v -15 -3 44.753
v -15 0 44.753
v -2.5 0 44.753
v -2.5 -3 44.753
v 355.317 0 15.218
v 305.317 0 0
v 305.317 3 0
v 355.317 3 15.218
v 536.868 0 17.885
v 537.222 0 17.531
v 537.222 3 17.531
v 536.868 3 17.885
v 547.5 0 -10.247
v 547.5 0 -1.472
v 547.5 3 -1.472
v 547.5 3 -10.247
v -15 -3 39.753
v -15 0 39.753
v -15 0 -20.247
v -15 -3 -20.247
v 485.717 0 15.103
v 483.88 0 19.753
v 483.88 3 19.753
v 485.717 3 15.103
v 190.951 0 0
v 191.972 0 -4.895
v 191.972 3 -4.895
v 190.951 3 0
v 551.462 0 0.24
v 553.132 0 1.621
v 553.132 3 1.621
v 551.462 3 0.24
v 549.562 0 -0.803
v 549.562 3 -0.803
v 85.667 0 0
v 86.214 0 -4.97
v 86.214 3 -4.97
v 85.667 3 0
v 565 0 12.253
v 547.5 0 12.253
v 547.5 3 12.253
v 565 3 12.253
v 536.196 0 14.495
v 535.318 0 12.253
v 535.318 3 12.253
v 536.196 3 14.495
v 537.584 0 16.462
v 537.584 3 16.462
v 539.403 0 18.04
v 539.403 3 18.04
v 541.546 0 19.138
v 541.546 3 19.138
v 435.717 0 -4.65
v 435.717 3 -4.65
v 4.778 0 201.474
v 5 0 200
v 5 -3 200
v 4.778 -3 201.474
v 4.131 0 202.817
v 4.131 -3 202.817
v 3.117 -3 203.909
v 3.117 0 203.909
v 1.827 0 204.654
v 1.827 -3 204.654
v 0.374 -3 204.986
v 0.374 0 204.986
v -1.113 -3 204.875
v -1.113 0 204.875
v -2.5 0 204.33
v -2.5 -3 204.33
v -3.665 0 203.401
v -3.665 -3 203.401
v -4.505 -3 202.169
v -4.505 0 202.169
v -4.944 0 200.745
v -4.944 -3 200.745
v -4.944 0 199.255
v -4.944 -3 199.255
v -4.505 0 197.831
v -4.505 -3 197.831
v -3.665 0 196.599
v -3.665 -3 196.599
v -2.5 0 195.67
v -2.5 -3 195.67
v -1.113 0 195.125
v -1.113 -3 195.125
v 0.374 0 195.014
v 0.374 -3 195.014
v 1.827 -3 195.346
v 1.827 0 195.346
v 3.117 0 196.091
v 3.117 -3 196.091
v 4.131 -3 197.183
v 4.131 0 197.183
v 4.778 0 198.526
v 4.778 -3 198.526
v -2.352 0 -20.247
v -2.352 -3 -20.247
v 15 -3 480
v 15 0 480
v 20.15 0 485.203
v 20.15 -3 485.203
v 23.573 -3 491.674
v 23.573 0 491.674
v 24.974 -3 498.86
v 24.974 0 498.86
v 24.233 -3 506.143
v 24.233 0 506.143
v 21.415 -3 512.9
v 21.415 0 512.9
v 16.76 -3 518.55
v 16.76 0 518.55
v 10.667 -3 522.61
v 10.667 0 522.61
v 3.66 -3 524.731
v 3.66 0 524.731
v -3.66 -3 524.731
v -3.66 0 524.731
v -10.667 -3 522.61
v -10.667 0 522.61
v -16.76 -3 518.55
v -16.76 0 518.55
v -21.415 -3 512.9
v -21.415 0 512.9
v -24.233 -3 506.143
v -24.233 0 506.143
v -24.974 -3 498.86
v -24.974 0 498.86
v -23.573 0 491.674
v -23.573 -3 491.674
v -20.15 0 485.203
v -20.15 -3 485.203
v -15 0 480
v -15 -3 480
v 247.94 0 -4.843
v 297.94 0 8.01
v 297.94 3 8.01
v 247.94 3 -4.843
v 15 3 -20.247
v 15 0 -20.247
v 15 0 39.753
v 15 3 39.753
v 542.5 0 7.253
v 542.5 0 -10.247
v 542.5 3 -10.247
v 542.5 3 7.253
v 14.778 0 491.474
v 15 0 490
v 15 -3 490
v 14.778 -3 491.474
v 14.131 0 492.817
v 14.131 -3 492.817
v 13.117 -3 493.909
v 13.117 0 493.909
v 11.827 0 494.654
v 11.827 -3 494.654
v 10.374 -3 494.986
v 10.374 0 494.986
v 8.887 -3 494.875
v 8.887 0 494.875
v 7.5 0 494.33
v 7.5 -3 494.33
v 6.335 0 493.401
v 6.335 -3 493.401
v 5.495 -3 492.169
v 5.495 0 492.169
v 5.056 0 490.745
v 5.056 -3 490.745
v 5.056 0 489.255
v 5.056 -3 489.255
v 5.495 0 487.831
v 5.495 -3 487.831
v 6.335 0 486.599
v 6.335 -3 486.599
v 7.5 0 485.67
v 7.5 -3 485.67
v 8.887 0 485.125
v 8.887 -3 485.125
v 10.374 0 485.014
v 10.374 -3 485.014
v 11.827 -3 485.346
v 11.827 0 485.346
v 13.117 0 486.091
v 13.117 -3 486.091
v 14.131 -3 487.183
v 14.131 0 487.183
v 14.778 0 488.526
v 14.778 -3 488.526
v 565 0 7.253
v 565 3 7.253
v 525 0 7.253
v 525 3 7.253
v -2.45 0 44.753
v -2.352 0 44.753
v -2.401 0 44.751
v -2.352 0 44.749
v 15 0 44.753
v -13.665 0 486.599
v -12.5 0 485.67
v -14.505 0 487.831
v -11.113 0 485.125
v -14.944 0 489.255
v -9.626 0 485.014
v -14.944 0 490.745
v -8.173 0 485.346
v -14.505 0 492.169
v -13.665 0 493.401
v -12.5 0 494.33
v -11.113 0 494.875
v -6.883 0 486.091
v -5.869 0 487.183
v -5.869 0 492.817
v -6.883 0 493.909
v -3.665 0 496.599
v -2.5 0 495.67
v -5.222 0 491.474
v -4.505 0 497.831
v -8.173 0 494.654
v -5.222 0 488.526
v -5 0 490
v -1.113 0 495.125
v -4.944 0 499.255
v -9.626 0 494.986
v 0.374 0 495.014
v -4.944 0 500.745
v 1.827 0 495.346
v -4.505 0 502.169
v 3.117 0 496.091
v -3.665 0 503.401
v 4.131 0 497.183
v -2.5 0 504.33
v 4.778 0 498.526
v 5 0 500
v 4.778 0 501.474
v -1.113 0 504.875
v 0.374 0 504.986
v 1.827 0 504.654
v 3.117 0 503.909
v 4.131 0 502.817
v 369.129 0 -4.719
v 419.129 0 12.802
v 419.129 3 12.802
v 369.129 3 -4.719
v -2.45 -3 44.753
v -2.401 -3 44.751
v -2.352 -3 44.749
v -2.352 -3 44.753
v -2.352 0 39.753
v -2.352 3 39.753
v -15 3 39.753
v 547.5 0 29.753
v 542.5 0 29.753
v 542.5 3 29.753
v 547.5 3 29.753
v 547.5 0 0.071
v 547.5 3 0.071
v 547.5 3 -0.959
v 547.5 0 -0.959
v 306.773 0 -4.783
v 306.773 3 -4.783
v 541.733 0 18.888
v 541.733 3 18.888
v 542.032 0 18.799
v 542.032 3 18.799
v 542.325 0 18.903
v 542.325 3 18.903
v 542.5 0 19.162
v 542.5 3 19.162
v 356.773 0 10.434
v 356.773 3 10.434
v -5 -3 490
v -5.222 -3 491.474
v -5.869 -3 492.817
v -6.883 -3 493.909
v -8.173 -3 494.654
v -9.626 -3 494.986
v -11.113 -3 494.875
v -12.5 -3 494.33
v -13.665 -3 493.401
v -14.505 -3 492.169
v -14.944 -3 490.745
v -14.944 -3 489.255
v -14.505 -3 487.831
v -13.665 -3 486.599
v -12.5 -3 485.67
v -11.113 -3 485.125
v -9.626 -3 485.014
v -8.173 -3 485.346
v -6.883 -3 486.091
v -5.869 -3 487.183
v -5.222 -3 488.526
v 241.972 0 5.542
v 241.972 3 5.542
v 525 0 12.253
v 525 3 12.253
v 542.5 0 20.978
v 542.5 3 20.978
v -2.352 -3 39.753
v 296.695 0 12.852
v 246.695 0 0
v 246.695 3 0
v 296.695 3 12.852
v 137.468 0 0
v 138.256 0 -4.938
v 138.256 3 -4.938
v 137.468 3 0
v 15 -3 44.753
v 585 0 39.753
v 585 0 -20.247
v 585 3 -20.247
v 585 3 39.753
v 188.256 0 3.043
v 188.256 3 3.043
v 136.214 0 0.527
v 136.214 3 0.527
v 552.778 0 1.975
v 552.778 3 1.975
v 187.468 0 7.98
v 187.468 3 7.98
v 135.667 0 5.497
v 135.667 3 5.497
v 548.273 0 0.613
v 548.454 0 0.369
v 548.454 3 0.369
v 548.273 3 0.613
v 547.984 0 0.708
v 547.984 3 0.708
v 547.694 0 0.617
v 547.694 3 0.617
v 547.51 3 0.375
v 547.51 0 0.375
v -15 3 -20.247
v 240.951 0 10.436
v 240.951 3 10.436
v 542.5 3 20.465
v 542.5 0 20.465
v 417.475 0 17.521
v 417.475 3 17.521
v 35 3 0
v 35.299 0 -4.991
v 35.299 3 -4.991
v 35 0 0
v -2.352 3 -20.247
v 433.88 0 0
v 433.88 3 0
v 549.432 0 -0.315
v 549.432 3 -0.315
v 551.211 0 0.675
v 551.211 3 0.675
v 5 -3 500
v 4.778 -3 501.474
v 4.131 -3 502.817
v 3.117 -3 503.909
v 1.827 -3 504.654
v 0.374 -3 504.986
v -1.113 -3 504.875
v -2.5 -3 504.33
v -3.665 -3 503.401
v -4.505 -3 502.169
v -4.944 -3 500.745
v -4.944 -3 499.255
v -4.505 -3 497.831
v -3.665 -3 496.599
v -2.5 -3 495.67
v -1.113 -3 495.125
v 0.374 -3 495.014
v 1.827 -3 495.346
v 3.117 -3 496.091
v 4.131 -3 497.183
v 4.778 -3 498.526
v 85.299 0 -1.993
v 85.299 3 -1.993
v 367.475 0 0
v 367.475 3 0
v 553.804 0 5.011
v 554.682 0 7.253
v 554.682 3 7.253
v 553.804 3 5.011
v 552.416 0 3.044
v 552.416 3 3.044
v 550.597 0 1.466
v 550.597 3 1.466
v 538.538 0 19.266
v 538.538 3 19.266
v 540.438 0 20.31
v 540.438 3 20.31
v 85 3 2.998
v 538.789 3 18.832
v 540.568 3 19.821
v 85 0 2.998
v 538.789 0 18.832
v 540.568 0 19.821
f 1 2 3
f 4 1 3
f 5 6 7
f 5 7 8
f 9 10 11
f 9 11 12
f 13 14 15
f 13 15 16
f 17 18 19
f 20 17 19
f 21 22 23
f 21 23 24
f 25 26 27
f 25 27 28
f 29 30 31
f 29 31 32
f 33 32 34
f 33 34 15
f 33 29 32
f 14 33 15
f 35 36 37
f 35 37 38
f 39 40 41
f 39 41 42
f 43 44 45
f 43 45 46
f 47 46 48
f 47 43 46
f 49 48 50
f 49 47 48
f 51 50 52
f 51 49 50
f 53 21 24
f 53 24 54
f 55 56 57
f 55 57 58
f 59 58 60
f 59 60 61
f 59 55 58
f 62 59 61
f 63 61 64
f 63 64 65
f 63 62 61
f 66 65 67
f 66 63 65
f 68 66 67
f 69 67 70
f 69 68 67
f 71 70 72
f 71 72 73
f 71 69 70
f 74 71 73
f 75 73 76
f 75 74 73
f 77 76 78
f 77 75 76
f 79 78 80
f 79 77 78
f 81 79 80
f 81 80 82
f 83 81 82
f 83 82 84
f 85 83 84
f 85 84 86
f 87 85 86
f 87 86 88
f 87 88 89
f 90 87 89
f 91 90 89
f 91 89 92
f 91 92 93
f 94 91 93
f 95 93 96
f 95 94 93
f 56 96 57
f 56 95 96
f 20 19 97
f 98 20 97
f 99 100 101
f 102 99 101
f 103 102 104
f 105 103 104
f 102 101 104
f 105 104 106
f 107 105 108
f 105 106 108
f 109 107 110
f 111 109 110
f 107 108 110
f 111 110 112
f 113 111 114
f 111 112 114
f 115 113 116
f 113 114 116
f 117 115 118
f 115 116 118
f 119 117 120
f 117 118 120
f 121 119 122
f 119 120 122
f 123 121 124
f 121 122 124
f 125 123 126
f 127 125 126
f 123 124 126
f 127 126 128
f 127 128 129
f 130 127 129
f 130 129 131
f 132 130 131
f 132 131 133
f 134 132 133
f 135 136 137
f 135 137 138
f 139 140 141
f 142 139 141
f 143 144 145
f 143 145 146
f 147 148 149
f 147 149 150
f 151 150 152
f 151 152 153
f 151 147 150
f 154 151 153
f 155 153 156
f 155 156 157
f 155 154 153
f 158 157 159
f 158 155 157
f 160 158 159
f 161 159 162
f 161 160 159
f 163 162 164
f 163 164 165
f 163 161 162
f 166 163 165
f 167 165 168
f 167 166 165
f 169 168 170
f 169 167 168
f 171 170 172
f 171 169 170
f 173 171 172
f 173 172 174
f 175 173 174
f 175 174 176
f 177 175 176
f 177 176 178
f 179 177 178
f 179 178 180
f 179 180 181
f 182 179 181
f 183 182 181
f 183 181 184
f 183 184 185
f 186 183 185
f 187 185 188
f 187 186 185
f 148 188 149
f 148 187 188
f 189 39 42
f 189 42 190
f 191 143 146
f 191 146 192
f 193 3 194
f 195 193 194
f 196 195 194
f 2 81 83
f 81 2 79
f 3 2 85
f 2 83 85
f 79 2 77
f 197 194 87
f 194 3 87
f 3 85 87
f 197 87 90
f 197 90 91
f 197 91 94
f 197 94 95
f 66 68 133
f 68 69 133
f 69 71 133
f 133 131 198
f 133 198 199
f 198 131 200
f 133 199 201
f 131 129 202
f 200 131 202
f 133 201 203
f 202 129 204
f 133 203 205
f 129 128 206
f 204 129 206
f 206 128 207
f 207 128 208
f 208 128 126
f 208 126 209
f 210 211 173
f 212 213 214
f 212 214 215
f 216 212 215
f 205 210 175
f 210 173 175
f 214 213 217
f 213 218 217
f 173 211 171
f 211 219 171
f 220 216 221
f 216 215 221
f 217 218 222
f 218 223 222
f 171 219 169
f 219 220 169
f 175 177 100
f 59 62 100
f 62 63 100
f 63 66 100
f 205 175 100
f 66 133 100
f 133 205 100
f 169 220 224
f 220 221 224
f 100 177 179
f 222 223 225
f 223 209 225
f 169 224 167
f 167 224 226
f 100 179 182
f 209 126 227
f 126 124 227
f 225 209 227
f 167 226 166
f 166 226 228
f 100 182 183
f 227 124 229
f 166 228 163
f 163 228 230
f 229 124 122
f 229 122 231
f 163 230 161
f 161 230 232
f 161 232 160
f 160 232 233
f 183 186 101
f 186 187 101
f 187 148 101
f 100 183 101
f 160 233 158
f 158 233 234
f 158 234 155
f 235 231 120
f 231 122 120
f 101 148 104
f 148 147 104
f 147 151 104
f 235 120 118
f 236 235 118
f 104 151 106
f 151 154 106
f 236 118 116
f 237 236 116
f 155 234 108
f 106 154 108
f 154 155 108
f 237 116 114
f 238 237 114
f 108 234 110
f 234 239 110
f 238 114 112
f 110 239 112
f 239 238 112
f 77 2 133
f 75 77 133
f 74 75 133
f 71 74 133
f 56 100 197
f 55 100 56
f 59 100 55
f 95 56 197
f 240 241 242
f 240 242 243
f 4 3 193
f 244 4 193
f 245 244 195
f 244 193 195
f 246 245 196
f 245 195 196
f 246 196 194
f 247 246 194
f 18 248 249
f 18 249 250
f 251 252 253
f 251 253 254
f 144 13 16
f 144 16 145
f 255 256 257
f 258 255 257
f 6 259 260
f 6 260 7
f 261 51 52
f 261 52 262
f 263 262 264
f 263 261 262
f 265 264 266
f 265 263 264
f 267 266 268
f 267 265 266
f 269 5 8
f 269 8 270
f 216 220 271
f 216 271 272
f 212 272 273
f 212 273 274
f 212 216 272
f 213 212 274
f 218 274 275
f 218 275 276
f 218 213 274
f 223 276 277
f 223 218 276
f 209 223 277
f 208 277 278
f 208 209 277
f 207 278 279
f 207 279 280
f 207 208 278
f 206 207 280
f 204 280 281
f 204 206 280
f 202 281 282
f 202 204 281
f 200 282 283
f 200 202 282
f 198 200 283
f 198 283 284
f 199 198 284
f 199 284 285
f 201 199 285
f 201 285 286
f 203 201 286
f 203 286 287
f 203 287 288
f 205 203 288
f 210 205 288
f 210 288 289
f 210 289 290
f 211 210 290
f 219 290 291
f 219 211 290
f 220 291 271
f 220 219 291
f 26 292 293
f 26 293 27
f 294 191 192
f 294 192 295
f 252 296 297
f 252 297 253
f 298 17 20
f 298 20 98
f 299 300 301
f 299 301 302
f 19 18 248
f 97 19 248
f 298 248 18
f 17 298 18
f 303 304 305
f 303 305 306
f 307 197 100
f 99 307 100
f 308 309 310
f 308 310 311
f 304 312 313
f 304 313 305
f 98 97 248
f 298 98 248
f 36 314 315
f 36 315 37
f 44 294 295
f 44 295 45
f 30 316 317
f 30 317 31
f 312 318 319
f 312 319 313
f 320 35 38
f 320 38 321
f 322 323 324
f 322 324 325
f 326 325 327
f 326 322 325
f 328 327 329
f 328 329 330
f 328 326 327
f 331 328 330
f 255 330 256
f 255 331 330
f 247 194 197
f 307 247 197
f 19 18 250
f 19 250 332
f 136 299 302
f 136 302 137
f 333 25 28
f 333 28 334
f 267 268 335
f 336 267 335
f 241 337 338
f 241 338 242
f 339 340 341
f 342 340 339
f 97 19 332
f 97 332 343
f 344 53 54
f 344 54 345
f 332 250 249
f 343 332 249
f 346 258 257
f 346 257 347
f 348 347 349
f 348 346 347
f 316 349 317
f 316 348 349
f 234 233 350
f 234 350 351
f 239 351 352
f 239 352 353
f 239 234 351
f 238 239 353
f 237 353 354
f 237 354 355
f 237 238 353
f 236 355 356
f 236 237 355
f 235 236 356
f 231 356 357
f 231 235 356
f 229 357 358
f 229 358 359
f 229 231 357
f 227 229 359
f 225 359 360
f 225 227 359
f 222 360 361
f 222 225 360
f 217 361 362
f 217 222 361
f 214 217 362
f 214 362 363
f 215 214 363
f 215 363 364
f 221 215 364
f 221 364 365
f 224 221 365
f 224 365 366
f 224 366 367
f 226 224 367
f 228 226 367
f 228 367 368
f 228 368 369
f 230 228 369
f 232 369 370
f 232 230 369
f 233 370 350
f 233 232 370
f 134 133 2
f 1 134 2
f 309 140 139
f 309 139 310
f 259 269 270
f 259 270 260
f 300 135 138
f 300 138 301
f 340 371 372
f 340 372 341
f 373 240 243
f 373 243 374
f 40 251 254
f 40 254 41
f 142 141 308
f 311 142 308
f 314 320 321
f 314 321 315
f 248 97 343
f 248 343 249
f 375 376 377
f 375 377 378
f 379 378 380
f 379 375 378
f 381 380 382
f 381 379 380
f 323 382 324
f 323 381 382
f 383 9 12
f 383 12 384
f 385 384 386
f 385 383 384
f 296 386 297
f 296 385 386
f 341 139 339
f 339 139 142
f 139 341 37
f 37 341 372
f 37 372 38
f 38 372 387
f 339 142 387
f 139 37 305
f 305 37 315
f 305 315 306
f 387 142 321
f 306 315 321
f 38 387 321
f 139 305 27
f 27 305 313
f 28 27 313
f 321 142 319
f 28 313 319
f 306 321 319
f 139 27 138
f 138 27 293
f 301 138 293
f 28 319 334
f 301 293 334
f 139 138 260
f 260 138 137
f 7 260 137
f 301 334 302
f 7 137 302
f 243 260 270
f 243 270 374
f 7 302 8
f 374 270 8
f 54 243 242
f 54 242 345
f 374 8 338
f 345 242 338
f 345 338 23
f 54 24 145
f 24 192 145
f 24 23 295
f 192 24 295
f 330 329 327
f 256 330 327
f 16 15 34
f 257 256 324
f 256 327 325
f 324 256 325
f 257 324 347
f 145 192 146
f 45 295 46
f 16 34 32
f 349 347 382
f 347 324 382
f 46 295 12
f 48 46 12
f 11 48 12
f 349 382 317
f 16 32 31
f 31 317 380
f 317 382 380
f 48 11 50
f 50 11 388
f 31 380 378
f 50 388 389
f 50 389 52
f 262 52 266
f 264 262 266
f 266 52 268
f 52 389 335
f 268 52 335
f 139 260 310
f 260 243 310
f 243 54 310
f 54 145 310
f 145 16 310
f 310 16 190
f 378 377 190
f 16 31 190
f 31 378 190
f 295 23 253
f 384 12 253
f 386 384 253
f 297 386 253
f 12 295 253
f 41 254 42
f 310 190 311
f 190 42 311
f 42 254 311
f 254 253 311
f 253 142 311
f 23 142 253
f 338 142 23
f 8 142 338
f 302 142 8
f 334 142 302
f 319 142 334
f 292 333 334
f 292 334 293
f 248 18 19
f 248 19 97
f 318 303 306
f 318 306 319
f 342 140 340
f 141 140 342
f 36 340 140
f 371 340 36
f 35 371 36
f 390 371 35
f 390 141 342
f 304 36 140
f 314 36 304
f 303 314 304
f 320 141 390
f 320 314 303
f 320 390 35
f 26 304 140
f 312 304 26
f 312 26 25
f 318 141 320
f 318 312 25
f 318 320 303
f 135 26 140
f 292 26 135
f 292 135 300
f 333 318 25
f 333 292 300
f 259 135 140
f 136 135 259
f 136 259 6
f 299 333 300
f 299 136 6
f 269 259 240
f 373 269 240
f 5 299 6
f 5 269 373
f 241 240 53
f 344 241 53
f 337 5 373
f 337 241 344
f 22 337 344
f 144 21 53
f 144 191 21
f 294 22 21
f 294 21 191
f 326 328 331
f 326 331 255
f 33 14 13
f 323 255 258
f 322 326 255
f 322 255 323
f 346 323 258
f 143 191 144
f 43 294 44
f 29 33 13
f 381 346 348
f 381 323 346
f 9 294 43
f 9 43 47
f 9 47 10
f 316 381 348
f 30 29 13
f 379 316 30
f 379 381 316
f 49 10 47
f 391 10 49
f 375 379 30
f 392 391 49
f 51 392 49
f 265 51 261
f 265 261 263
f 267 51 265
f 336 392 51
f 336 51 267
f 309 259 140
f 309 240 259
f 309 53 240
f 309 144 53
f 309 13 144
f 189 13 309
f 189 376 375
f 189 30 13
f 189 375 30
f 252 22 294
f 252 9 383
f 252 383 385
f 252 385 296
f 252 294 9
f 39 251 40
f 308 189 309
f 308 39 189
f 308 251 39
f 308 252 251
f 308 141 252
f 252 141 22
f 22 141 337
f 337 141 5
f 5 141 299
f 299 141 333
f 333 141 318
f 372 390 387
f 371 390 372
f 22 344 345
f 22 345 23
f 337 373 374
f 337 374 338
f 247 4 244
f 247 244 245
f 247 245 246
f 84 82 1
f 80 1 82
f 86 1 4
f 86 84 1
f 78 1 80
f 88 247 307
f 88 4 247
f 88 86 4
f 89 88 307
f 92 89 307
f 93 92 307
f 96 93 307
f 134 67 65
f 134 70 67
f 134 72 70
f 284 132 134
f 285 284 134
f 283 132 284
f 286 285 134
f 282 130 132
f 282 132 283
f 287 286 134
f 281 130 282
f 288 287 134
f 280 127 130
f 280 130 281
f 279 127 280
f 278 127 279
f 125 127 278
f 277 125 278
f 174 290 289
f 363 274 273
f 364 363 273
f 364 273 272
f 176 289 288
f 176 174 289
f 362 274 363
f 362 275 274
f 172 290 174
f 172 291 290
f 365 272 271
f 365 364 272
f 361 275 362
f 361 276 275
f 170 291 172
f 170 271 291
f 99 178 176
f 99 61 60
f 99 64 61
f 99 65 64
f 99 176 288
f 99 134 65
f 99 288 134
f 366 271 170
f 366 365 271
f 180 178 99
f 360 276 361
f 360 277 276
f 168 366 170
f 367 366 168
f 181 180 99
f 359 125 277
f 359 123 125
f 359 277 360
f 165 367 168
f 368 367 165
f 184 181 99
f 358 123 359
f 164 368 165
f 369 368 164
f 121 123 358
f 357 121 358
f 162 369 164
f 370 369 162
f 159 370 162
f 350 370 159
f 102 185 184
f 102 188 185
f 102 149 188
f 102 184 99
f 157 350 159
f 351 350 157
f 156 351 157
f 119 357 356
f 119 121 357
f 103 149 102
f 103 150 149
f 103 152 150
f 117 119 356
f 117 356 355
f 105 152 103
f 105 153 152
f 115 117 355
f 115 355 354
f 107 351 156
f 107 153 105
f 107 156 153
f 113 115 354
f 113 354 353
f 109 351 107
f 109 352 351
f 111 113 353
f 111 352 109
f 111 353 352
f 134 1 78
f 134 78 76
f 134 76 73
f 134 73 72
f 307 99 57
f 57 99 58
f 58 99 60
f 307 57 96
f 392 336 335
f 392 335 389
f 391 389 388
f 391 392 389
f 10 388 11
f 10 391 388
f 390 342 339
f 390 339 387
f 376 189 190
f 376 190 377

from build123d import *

# Parameters (mm, degrees)
F0_R     = 5
F1_DEPTH = 3
F0_W     = 570
F0_H     = 60
F2_DEPTH = 3


with BuildPart() as f1:
    # F0 (on Front) → F1 (new body)
    with BuildSketch(Plane.XZ):
        Polygon((-15, 39.753178), (-15, -20.246822), (-2.351508, -20.246822), (-2.351508, 9.753178), (-2.351508, 39.753178), align=None)
        with BuildLine():
            Line((-15, 480), (-15, 44.753178))
            Line((-15, 44.753178), (-2.5, 44.753178))
            ThreePointArc((-2.5, 44.753178), (-2.425721, 44.752075), (-2.351508, 44.748768))
            Line((-2.351508, 44.748768), (-2.351508, 44.753178))
            Line((-2.351508, 44.753178), (2.5, 44.753178))
            Line((2.5, 44.753178), (15, 44.753178))
            Line((15, 44.753178), (15, 480))
            ThreePointArc((15, 480), (0, 525), (-15, 480))
        make_face()
        with Locations((0, 200)):
            Circle(F0_R, mode=Mode.SUBTRACT)
        with Locations((-10, 490)):
            Circle(F0_R, mode=Mode.SUBTRACT)
        with Locations((10, 490)):
            Circle(F0_R, mode=Mode.SUBTRACT)
        with Locations((0, 500)):
            Circle(F0_R, mode=Mode.SUBTRACT)
    extrude(amount=F1_DEPTH)


with BuildPart() as f2:
    # F0 (on Front) → F2 (new body)
    with BuildSketch(Plane.XZ):
        with Locations((300, 9.753178)):
            Rectangle(F0_W, F0_H)
        Polygon((35.299283, -4.991035), (35, 0), (85, 2.998202), (85.299283, -1.992833), align=None, mode=Mode.SUBTRACT)
        Polygon((86.213652, -4.970057), (85.667274, 0), (135.667274, 5.496704), (136.213652, 0.526647), align=None, mode=Mode.SUBTRACT)
        Polygon((138.255755, -4.937509), (137.467715, 0), (187.467715, 7.980141), (188.255755, 3.042632), align=None, mode=Mode.SUBTRACT)
        Polygon((191.972288, -4.894523), (190.950698, 0), (240.950698, 10.436057), (241.972288, 5.541534), align=None, mode=Mode.SUBTRACT)
        Polygon((247.940159, -4.842576), (246.695388, 0), (296.695388, 12.852362), (297.940159, 8.009786), align=None, mode=Mode.SUBTRACT)
        Polygon((306.773132, -4.783364), (305.317308, 0), (355.317308, 15.217578), (356.773132, 10.434213), align=None, mode=Mode.SUBTRACT)
        Polygon((369.128901, -4.718672), (367.475379, 0), (417.475379, 17.521056), (419.128901, 12.802384), align=None, mode=Mode.SUBTRACT)
        Polygon((435.716668, -4.650257), (433.879521, 0), (483.879521, 19.753178), (485.716668, 15.102921), align=None, mode=Mode.SUBTRACT)
        with BuildLine():
            Line((547.5, 12.253178), (565, 12.253178))
            Line((565, 12.253178), (565, 7.253178))
            Line((565, 7.253178), (554.682458, 7.253178))
            ThreePointArc((554.682458, 7.253178), (552.415672, 3.044392), (548.454241, 0.368711))
            ThreePointArc((548.454241, 0.368711), (547.831804, 0.685053), (547.5, 0.07072))
            Line((547.5, 0.07072), (547.5, -0.958965))
            ThreePointArc((547.5, -0.958965), (550.344367, 0.138723), (552.778175, 1.975003))
            Line((552.778175, 1.975003), (553.131728, 1.62145))
            ThreePointArc((553.131728, 1.62145), (550.536285, -0.326482), (547.5, -1.471794))
            Line((547.5, -1.471794), (547.5, -10.246822))
            Line((547.5, -10.246822), (542.5, -10.246822))
            Line((542.5, -10.246822), (542.5, 7.253178))
            Line((542.5, 7.253178), (525, 7.253178))
            Line((525, 7.253178), (525, 12.253178))
            Line((525, 12.253178), (535.317542, 12.253178))
            ThreePointArc((535.317542, 12.253178), (537.584328, 16.461964), (541.545759, 19.137645))
            ThreePointArc((541.545759, 19.137645), (542.031653, 18.798729), (542.5, 19.161508))
            Line((542.5, 19.161508), (542.5, 19.435636))
            Line((542.5, 19.435636), (542.5, 20.465321))
            ThreePointArc((542.5, 20.465321), (539.655633, 19.367633), (537.221825, 17.531353))
            Line((537.221825, 17.531353), (536.868272, 17.884906))
            ThreePointArc((536.868272, 17.884906), (539.463715, 19.832838), (542.5, 20.97815))
            Line((542.5, 20.97815), (542.5, 29.753178))
            Line((542.5, 29.753178), (547.5, 29.753178))
            Line((547.5, 29.753178), (547.5, 12.253178))
        make_face(mode=Mode.SUBTRACT)
        Polygon((-15, 39.753178), (-15, -20.246822), (-2.351508, -20.246822), (-2.351508, 9.753178), (-2.351508, 39.753178), align=None)
    extrude(amount=-F2_DEPTH)


solid = Compound([f1.part, f2.part])
